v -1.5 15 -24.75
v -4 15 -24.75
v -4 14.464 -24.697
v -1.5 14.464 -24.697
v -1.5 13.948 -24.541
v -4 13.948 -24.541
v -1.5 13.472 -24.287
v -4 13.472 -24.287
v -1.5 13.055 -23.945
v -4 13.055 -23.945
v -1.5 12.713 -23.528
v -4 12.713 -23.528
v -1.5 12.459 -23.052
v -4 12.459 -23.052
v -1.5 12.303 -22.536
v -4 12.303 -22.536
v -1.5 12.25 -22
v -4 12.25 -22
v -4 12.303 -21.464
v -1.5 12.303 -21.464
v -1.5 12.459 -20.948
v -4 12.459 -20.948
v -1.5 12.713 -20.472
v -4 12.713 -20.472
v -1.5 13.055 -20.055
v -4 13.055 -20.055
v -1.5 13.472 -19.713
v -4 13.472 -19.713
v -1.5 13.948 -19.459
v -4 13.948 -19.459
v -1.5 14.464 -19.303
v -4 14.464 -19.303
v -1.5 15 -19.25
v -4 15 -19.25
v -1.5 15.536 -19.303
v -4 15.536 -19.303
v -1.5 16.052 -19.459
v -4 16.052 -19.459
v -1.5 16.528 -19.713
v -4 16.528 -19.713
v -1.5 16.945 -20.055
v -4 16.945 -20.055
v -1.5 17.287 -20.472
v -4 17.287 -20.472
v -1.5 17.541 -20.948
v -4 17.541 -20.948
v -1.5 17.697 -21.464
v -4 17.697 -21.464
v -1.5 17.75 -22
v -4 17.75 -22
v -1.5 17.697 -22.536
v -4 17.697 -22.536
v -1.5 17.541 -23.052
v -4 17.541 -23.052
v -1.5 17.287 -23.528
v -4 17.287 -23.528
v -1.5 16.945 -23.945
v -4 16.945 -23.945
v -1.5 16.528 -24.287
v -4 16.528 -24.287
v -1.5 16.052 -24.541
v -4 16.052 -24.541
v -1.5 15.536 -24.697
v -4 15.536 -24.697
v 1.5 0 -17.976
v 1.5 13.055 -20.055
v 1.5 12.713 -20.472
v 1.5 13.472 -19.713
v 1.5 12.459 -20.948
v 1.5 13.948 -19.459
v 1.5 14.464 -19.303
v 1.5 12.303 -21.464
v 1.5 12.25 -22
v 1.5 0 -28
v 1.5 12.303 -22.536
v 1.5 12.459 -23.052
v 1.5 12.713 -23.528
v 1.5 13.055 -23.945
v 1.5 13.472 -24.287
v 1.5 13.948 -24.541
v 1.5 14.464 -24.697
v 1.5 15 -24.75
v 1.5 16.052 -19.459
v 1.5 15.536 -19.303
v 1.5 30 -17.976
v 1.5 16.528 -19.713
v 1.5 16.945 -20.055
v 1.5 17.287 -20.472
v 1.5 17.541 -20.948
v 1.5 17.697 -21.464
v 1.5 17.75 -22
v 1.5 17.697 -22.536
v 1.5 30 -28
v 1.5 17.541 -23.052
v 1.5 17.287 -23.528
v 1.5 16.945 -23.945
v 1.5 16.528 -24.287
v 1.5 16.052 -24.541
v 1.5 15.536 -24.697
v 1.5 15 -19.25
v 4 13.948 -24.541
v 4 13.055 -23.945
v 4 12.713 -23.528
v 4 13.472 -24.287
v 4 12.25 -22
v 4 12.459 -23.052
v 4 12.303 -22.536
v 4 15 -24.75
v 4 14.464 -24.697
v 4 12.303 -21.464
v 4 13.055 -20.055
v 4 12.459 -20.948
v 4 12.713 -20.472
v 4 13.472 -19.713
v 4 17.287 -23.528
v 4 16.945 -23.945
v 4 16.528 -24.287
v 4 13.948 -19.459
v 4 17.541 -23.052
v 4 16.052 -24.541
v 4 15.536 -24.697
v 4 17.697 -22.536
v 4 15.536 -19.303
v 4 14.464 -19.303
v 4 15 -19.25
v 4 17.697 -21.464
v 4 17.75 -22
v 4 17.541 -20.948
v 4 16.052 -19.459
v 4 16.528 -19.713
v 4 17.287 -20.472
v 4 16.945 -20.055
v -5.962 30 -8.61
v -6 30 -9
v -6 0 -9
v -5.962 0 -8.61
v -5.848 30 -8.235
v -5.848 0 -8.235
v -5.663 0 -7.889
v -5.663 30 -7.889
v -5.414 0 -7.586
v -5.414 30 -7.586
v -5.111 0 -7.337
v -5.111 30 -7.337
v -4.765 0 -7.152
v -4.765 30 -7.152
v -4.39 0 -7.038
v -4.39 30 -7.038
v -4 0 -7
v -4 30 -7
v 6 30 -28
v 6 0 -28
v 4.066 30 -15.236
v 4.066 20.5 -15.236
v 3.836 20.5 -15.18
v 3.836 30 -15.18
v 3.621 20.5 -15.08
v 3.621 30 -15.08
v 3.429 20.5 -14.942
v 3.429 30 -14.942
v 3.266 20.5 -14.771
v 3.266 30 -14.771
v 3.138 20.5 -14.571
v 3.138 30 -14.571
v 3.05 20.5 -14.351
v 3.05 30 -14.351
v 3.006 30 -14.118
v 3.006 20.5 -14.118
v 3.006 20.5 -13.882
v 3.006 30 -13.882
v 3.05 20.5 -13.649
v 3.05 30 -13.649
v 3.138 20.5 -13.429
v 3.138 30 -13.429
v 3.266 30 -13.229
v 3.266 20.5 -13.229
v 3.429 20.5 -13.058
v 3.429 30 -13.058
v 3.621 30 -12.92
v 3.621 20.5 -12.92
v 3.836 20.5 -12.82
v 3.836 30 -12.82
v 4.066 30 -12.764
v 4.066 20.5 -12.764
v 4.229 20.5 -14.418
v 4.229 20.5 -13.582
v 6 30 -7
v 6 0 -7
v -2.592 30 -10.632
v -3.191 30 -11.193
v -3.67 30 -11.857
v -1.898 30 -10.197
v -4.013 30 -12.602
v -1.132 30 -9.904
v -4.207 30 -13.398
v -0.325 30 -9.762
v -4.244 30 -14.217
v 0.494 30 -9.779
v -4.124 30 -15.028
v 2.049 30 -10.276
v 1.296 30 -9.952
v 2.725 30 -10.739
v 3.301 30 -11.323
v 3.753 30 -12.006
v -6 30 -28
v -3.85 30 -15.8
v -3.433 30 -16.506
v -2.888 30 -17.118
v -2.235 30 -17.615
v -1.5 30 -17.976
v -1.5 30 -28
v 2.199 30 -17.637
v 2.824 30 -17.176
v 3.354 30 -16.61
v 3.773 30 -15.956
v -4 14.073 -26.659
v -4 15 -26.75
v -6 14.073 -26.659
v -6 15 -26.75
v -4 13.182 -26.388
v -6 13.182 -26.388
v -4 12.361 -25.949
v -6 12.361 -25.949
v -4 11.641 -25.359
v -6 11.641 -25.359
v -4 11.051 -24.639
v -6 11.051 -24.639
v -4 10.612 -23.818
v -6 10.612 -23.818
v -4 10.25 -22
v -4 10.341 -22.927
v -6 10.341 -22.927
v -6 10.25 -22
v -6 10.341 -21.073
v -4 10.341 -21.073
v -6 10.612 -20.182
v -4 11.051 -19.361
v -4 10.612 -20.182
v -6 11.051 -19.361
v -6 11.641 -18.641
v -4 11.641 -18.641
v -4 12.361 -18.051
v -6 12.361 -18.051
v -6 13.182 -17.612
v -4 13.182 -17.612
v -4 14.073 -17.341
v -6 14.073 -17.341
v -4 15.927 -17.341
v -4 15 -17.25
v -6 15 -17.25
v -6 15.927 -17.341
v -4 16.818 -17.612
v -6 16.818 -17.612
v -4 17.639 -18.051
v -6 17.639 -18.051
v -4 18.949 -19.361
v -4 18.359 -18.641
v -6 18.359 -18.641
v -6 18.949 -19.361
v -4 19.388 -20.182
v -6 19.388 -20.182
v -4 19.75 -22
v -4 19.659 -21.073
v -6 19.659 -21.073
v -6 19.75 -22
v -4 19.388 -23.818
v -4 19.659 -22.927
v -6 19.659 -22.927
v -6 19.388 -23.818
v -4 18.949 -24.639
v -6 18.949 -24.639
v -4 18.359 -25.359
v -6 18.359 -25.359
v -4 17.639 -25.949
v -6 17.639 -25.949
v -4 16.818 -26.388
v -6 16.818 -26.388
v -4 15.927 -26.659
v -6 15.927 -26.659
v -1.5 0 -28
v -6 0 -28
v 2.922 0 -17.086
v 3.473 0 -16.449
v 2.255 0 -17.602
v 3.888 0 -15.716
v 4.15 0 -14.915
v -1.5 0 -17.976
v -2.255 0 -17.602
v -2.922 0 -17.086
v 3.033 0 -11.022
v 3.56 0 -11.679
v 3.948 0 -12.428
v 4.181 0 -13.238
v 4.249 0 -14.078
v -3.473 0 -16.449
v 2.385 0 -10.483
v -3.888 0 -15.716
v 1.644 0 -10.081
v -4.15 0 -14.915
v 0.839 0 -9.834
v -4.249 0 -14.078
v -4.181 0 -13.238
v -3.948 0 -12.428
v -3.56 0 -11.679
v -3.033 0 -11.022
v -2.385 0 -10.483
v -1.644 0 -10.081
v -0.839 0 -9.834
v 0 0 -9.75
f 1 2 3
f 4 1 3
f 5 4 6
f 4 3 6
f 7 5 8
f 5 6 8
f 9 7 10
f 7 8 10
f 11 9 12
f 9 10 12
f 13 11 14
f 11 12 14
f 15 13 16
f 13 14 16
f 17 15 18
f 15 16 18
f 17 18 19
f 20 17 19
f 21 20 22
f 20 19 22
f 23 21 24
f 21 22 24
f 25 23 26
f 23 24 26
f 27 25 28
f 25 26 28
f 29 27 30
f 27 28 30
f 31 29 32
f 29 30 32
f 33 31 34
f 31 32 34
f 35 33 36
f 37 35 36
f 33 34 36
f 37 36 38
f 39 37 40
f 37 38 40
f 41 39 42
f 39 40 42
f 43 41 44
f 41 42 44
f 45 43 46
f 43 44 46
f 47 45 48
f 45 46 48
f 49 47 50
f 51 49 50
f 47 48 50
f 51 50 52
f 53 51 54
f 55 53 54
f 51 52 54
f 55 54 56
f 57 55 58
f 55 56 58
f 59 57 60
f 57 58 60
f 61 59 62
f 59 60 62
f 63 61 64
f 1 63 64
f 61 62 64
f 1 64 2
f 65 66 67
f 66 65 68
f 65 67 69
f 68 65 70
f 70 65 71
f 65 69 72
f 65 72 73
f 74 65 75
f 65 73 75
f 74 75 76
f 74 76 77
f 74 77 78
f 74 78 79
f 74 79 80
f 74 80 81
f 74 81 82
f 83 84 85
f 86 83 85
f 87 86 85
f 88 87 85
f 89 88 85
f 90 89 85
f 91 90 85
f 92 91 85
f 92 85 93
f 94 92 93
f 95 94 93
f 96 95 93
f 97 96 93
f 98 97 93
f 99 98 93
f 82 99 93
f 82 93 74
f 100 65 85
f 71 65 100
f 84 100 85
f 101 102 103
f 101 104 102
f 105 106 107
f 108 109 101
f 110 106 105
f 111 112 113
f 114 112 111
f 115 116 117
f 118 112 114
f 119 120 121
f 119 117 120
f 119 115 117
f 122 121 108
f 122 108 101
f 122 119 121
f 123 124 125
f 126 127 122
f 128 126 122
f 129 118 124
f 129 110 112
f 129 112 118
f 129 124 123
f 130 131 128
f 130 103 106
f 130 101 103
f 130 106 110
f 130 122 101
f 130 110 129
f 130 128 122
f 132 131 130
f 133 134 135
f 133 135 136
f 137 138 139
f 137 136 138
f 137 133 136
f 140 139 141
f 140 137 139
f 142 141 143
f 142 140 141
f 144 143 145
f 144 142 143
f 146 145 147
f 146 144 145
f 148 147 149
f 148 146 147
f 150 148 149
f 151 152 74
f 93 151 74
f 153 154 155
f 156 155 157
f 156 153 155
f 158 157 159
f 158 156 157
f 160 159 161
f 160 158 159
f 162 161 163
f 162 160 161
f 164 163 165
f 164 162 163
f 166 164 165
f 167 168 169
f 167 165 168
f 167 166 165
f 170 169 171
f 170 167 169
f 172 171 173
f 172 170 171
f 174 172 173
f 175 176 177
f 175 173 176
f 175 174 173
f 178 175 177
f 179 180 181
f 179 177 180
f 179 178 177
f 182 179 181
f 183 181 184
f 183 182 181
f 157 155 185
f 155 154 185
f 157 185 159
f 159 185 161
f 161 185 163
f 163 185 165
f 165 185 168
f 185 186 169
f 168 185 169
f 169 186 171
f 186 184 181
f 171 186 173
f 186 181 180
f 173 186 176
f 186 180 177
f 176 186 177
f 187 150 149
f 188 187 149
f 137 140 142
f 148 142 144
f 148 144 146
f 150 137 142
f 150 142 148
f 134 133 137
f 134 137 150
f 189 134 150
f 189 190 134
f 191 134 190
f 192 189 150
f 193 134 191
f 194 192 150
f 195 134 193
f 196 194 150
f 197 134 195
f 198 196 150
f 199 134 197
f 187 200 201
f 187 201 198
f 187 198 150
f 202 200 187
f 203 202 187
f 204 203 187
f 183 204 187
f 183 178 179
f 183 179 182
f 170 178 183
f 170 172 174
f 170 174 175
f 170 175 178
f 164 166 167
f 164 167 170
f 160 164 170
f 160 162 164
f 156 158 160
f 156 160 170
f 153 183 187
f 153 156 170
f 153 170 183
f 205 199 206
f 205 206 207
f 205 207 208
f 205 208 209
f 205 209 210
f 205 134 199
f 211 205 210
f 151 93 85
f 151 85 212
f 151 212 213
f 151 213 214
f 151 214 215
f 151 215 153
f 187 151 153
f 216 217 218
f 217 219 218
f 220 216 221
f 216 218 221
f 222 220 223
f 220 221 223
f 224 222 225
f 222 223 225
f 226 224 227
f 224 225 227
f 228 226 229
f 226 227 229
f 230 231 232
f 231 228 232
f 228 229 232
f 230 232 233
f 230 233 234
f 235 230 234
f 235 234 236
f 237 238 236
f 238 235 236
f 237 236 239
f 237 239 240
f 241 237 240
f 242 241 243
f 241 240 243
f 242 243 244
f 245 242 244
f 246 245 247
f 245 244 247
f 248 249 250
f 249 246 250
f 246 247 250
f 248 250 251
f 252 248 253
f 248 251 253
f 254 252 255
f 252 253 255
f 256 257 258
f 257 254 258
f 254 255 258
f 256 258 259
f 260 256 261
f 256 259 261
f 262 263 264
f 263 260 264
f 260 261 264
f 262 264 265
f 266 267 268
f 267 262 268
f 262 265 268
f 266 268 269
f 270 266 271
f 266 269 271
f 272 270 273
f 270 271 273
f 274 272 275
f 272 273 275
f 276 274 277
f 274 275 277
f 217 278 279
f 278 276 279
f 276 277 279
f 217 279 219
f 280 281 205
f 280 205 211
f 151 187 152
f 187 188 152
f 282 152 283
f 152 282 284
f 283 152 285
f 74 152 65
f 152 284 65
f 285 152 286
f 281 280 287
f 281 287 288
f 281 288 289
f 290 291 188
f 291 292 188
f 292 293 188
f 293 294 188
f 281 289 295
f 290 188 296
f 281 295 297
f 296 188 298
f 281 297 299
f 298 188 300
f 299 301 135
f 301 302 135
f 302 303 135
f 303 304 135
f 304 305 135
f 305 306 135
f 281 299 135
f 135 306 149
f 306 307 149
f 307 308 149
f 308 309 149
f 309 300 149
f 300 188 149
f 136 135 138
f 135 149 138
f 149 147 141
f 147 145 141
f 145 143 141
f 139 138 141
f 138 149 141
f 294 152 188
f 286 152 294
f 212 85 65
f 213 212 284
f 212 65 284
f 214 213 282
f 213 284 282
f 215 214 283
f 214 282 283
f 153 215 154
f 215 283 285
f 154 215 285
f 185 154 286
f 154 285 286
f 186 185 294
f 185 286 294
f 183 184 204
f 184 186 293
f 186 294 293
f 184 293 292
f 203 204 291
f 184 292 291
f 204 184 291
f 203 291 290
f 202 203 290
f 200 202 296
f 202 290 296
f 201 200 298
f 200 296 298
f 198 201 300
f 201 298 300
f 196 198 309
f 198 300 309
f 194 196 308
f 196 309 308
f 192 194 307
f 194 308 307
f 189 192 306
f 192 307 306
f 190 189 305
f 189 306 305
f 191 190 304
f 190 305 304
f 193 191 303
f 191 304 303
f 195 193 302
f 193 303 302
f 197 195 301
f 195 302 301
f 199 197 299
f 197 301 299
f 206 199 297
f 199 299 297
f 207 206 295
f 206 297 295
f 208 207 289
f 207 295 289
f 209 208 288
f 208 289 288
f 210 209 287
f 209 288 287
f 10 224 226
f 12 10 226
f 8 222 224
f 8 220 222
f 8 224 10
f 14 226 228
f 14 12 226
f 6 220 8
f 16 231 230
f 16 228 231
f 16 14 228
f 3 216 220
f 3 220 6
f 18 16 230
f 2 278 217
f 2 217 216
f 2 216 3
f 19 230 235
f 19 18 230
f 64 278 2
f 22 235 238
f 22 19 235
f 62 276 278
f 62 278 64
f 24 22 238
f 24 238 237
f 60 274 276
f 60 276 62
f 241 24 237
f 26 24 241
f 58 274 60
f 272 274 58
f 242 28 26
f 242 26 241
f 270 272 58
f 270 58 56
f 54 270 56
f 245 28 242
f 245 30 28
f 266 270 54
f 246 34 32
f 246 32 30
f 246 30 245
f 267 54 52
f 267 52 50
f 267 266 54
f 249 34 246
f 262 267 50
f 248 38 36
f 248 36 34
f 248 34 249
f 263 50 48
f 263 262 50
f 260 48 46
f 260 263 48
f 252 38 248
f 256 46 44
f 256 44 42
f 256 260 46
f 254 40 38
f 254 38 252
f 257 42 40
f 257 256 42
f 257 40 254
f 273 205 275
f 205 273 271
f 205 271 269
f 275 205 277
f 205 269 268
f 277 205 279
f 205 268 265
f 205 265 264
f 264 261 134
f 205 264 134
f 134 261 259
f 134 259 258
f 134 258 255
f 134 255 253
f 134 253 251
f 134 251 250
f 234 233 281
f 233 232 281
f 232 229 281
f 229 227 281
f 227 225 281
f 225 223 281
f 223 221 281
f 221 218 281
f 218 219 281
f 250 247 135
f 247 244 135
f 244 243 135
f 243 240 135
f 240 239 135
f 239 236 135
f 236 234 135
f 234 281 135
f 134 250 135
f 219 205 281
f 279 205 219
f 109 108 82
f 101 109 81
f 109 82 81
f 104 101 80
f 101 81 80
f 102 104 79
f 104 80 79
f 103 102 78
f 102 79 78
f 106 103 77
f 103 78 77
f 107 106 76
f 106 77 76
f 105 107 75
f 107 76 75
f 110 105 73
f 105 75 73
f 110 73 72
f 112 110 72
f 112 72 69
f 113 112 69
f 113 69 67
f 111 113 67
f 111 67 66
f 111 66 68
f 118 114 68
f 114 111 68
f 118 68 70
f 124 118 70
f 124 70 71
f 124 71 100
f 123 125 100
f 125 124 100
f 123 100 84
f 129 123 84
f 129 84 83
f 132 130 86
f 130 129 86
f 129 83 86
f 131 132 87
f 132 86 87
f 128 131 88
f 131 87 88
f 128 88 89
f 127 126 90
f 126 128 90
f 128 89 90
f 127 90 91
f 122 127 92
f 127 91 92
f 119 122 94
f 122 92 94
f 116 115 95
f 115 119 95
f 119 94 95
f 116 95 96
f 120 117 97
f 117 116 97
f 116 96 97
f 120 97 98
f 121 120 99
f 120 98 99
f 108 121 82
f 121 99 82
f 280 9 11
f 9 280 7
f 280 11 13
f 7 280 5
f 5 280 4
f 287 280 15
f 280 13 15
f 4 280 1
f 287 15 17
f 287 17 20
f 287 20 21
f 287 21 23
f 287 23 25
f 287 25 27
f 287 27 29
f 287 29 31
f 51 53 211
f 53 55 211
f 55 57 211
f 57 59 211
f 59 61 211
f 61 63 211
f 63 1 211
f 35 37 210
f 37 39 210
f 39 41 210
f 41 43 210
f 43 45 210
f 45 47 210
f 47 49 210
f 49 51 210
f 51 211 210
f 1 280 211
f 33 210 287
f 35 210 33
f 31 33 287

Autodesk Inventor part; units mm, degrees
ref_plane "YZ Plane" through (0, 0, 0) normal (1, 0, 0) x (0, 1, 0)
ref_plane "XZ Plane" through (0, 0, 0) normal (0, 1, 0) x (-1, 0, 0)
ref_plane "XY Plane" through (0, 0, 0) normal (0, 0, 1) x (1, 0, 0)
sketch "Sketch1" plane through (0, 0, 0) normal (0, 1, 0) x (-1, 0, 0)
  circle A0 centre (0, 0) radius 4.25
  line L0 (6, 7) -> (-6, 7)
  line L1 (-6, 7) -> (-6, -7)
  line L2 (-6, -7) -> (6, -7)
  line L3 (6, -7) -> (6, 7)
  line L4 (6, 7) -> (-6, 7)
  line L5 (-6, 7) -> (-6, 14)
  line L6 (-6, 14) -> (6, 14)
  line L7 (6, 14) -> (6, 7)
  point P0 (-6, 7)
  dimension "d0" = 8.5
  dimension "d1" = 6
  dimension "d2" = 14
  dimension "d3" = 12
  dimension "d4" = 7
  dimension "d5" = 7
extrude "Extrusion1" add sketch "Sketch1" along normal blind 35
sketch "Sketch2" plane through (0, 35, 0) normal (0, 1, 0) x (1, 0, 0)
  line L0 (-1.5, -16.1218) -> (1.5, -16.1218)
  line L1 (1.5, -16.1218) -> (1.5, -1.7668)
  line L2 (1.5, -1.7668) -> (-1.5, -1.7668)
  line L3 (-1.5, -1.7668) -> (-1.5, -16.1218)
  point P0 (0, 0)
  dimension "d8" = 1.5
  dimension "d9" = 1.5
extrude "Extrusion2" cut sketch "Sketch2" against normal through all
sketch "Sketch3" plane through (-6, 0, -7) normal (-1, 0, 0) x (0, 0, 1)
  circle A0 centre (15, 15) radius 2.75
  line L0 (21, 0) -> (21, 35) projected
  line L1 (0, 0) -> (21, 0) projected
  point P0 (7, 0)
  dimension "d12" = 5.5
  dimension "d13" = 6
  dimension "d14" = 15
extrude "Extrusion3" cut sketch "Sketch3" against normal blind 10
sketch "Sketch4" plane through (0, 35, 0) normal (0, 1, 0) x (1, 0, 0)
  arc A0 (1.5, -3.9765) -> (-1.5, -3.9765) centre (0, 0) ccw projected
  circle A1 centre (4.25, 0) radius 1.25
  point P0 (4.0662, 1.2364)
  point P1 (4.0662, -1.2364)
  dimension "d17" = 2.5
extrude "Extrusion4" add sketch "Sketch4" against normal blind 14.5 contours A1 A0 picked at (3.8196, 0)
sketch "Sketch5" plane through (0, 35, 0) normal (0, 1, 0) x (1, 0, 0)
  line L0 (1.5, -14) -> (6, -14) projected
  line L1 (6, -14) -> (36, -14)
  line L2 (36, -14) -> (36, 7)
  line L3 (36, 7) -> (6, 7)
  line L4 (6, 7) -> (6, -14)
  circle A0 centre (21, -3.5) radius 2.75
  point P0 (0, 0)
  dimension "d20" = 30
  dimension "d21" = 15
  dimension "d22" = 10.5
  dimension "d23" = 5.5
extrude "Extrusion5" add sketch "Sketch5" against normal blind 5
sketch "Sketch6" plane through (0, 35, 0) normal (0, 1, 0) x (1, 0, 0)
  circle A0 centre (21, -3.5) radius 2.75 projected
  circle A1 centre (21, -3.5) radius 4.75
  point P0 (0, 0)
  dimension "d26" = 9.5
extrude "Extrusion6" cut sketch "Sketch6" against normal blind 2
sketch "Sketch7" plane through (-6, 0, -7) normal (-1, 0, 0) x (0, 0, 1)
  circle A0 centre (15, 15) radius 2.75 projected
  circle A1 centre (15, 15) radius 4.75
  point P0 (7, 0)
  dimension "d29" = 9.5
extrude "Extrusion7" cut sketch "Sketch7" against normal blind 2
fillet "Fillet1" radius 2 3 edges at (-6, 17.5, -7) (36, 32.5, -7) (36, 32.5, 14)
sketch "Sketch9" plane through (0, 35, 0) normal (0, 1, 0) x (1, 0, 0)
  line L0 (-21.5057, -29.1514) -> (41.8439, -29.1514)
  line L1 (41.8439, -29.1514) -> (41.8439, 16.5719)
  line L2 (41.8439, 16.5719) -> (-21.5057, 16.5719)
  line L3 (-21.5057, 16.5719) -> (-21.5057, -29.1514)
  point P0 (0, 0)
extrude "Extrusion8" cut sketch "Sketch9" against normal blind 5
mirror "Mirror1" about plane through (6, 0, -7) normal (0, 0, -1) of "Extrusion1", "Extrusion2", "Extrusion3", "Extrusion4", "Extrusion5", "Extrusion6", "Extrusion7", "Fillet1", "Extrusion8"
sketch "Sketch10" plane through (-6, 0, -5) normal (-1, 0, 0) x (0, 0, 1)
  line L0 (-2, 30) -> (-2, 0) projected
  line L1 (26.294, -8.8637) -> (-2, -8.8637)
  line L2 (-2, -8.8637) -> (-2, 30)
  line L3 (-2, 30) -> (26.294, 30)
  line L4 (26.294, 30) -> (26.294, -8.8637)
  point P0 (5, 0)
  point P1 (-2, 0)
extrude "Extrusion9" cut sketch "Sketch10" against normal through all
properties part number "YsupportB"
